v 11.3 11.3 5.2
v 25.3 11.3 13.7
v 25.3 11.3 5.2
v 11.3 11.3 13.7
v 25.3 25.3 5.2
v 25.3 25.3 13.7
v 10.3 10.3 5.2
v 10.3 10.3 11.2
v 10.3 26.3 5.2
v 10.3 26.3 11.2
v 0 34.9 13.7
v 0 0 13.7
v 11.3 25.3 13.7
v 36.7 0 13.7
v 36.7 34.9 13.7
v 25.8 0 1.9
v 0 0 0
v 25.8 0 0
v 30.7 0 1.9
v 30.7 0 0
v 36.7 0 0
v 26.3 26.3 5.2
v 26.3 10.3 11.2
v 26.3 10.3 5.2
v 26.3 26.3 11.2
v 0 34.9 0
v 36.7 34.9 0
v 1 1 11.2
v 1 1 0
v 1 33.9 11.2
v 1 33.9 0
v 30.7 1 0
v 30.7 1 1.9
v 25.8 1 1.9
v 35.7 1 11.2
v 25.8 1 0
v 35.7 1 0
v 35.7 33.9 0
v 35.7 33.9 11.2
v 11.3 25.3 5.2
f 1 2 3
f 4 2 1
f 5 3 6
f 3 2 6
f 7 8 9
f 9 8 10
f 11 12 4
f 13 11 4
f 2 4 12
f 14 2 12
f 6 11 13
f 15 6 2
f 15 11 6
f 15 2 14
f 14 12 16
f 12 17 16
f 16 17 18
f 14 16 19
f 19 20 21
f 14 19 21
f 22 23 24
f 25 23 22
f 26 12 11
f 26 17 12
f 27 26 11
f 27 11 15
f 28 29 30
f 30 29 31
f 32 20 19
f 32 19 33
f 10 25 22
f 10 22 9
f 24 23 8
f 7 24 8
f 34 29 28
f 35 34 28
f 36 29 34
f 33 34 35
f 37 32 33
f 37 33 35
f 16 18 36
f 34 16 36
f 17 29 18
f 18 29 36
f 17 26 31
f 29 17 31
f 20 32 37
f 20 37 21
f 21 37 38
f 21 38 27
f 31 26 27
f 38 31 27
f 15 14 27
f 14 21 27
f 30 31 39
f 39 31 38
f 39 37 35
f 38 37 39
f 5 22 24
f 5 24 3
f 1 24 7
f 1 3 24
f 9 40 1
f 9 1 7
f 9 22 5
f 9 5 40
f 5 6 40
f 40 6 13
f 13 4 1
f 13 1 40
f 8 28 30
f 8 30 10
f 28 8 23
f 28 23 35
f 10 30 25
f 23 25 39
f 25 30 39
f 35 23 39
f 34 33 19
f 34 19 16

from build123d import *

# Parameters (mm, degrees)
SKETCH1_W           = 36.7
SKETCH1_H           = 34.9
SKETCH1_W_2         = 34.7
SKETCH1_H_2         = 32.9
BOSS_EXTRUDE1_DEPTH = 11.2
SKETCH2_W           = 4.9
SKETCH2_H           = 1
CUT_EXTRUDE1_DEPTH  = 1.9
SKETCH4_W           = 36.7
SKETCH4_H           = 34.9
BOSS_EXTRUDE3_DEPTH = 2.5
SKETCH5_W           = 14
SKETCH5_H           = 14
CUT_EXTRUDE2_DEPTH  = 14.7
SKETCH6_W           = 16
SKETCH6_H           = 16
SKETCH6_W_2         = 14
SKETCH6_H_2         = 14
BOSS_EXTRUDE4_DEPTH = 6


with BuildPart() as part:
    # Sketch1 → Boss-Extrude1 (new body)
    with BuildSketch(Plane.XY):
        with Locations((18.35, 17.45)):
            Rectangle(SKETCH1_W, SKETCH1_H)
        with Locations((18.35, 17.45)):
            Rectangle(SKETCH1_W_2, SKETCH1_H_2, mode=Mode.SUBTRACT)
    extrude(amount=BOSS_EXTRUDE1_DEPTH)

    # Sketch2 → Cut-Extrude1 (cut)
    with BuildSketch(Plane(origin=(0, 0, 0), x_dir=(-1, 0, 0), z_dir=(0, 0, -1))):
        with Locations((-28.25, 0.5)):
            Rectangle(SKETCH2_W, SKETCH2_H)
    extrude(amount=-CUT_EXTRUDE1_DEPTH, mode=Mode.SUBTRACT)

    # Sketch4 → Boss-Extrude3 (add)
    with BuildSketch(Plane.XY.offset(11.2)):
        with Locations((18.35, 17.45)):
            Rectangle(SKETCH4_W, SKETCH4_H)
    extrude(amount=BOSS_EXTRUDE3_DEPTH)

    # Sketch5 → Cut-Extrude2 (cut, through all)
    with BuildSketch(Plane.XY.offset(13.7)):
        with Locations((18.3, 18.3)):
            Rectangle(SKETCH5_W, SKETCH5_H)
    extrude(amount=-CUT_EXTRUDE2_DEPTH, mode=Mode.SUBTRACT)

    # Sketch6 → Boss-Extrude4 (add)
    with BuildSketch(Plane(origin=(0, 0, 11.2), x_dir=(-1, 0, 0), z_dir=(0, 0, -1))):
        with Locations((-18.3, 18.3)):
            Rectangle(SKETCH6_W, SKETCH6_H)
        with Locations((-18.3, 18.3)):
            Rectangle(SKETCH6_W_2, SKETCH6_H_2, mode=Mode.SUBTRACT)
    extrude(amount=BOSS_EXTRUDE4_DEPTH)


solid = part.part
